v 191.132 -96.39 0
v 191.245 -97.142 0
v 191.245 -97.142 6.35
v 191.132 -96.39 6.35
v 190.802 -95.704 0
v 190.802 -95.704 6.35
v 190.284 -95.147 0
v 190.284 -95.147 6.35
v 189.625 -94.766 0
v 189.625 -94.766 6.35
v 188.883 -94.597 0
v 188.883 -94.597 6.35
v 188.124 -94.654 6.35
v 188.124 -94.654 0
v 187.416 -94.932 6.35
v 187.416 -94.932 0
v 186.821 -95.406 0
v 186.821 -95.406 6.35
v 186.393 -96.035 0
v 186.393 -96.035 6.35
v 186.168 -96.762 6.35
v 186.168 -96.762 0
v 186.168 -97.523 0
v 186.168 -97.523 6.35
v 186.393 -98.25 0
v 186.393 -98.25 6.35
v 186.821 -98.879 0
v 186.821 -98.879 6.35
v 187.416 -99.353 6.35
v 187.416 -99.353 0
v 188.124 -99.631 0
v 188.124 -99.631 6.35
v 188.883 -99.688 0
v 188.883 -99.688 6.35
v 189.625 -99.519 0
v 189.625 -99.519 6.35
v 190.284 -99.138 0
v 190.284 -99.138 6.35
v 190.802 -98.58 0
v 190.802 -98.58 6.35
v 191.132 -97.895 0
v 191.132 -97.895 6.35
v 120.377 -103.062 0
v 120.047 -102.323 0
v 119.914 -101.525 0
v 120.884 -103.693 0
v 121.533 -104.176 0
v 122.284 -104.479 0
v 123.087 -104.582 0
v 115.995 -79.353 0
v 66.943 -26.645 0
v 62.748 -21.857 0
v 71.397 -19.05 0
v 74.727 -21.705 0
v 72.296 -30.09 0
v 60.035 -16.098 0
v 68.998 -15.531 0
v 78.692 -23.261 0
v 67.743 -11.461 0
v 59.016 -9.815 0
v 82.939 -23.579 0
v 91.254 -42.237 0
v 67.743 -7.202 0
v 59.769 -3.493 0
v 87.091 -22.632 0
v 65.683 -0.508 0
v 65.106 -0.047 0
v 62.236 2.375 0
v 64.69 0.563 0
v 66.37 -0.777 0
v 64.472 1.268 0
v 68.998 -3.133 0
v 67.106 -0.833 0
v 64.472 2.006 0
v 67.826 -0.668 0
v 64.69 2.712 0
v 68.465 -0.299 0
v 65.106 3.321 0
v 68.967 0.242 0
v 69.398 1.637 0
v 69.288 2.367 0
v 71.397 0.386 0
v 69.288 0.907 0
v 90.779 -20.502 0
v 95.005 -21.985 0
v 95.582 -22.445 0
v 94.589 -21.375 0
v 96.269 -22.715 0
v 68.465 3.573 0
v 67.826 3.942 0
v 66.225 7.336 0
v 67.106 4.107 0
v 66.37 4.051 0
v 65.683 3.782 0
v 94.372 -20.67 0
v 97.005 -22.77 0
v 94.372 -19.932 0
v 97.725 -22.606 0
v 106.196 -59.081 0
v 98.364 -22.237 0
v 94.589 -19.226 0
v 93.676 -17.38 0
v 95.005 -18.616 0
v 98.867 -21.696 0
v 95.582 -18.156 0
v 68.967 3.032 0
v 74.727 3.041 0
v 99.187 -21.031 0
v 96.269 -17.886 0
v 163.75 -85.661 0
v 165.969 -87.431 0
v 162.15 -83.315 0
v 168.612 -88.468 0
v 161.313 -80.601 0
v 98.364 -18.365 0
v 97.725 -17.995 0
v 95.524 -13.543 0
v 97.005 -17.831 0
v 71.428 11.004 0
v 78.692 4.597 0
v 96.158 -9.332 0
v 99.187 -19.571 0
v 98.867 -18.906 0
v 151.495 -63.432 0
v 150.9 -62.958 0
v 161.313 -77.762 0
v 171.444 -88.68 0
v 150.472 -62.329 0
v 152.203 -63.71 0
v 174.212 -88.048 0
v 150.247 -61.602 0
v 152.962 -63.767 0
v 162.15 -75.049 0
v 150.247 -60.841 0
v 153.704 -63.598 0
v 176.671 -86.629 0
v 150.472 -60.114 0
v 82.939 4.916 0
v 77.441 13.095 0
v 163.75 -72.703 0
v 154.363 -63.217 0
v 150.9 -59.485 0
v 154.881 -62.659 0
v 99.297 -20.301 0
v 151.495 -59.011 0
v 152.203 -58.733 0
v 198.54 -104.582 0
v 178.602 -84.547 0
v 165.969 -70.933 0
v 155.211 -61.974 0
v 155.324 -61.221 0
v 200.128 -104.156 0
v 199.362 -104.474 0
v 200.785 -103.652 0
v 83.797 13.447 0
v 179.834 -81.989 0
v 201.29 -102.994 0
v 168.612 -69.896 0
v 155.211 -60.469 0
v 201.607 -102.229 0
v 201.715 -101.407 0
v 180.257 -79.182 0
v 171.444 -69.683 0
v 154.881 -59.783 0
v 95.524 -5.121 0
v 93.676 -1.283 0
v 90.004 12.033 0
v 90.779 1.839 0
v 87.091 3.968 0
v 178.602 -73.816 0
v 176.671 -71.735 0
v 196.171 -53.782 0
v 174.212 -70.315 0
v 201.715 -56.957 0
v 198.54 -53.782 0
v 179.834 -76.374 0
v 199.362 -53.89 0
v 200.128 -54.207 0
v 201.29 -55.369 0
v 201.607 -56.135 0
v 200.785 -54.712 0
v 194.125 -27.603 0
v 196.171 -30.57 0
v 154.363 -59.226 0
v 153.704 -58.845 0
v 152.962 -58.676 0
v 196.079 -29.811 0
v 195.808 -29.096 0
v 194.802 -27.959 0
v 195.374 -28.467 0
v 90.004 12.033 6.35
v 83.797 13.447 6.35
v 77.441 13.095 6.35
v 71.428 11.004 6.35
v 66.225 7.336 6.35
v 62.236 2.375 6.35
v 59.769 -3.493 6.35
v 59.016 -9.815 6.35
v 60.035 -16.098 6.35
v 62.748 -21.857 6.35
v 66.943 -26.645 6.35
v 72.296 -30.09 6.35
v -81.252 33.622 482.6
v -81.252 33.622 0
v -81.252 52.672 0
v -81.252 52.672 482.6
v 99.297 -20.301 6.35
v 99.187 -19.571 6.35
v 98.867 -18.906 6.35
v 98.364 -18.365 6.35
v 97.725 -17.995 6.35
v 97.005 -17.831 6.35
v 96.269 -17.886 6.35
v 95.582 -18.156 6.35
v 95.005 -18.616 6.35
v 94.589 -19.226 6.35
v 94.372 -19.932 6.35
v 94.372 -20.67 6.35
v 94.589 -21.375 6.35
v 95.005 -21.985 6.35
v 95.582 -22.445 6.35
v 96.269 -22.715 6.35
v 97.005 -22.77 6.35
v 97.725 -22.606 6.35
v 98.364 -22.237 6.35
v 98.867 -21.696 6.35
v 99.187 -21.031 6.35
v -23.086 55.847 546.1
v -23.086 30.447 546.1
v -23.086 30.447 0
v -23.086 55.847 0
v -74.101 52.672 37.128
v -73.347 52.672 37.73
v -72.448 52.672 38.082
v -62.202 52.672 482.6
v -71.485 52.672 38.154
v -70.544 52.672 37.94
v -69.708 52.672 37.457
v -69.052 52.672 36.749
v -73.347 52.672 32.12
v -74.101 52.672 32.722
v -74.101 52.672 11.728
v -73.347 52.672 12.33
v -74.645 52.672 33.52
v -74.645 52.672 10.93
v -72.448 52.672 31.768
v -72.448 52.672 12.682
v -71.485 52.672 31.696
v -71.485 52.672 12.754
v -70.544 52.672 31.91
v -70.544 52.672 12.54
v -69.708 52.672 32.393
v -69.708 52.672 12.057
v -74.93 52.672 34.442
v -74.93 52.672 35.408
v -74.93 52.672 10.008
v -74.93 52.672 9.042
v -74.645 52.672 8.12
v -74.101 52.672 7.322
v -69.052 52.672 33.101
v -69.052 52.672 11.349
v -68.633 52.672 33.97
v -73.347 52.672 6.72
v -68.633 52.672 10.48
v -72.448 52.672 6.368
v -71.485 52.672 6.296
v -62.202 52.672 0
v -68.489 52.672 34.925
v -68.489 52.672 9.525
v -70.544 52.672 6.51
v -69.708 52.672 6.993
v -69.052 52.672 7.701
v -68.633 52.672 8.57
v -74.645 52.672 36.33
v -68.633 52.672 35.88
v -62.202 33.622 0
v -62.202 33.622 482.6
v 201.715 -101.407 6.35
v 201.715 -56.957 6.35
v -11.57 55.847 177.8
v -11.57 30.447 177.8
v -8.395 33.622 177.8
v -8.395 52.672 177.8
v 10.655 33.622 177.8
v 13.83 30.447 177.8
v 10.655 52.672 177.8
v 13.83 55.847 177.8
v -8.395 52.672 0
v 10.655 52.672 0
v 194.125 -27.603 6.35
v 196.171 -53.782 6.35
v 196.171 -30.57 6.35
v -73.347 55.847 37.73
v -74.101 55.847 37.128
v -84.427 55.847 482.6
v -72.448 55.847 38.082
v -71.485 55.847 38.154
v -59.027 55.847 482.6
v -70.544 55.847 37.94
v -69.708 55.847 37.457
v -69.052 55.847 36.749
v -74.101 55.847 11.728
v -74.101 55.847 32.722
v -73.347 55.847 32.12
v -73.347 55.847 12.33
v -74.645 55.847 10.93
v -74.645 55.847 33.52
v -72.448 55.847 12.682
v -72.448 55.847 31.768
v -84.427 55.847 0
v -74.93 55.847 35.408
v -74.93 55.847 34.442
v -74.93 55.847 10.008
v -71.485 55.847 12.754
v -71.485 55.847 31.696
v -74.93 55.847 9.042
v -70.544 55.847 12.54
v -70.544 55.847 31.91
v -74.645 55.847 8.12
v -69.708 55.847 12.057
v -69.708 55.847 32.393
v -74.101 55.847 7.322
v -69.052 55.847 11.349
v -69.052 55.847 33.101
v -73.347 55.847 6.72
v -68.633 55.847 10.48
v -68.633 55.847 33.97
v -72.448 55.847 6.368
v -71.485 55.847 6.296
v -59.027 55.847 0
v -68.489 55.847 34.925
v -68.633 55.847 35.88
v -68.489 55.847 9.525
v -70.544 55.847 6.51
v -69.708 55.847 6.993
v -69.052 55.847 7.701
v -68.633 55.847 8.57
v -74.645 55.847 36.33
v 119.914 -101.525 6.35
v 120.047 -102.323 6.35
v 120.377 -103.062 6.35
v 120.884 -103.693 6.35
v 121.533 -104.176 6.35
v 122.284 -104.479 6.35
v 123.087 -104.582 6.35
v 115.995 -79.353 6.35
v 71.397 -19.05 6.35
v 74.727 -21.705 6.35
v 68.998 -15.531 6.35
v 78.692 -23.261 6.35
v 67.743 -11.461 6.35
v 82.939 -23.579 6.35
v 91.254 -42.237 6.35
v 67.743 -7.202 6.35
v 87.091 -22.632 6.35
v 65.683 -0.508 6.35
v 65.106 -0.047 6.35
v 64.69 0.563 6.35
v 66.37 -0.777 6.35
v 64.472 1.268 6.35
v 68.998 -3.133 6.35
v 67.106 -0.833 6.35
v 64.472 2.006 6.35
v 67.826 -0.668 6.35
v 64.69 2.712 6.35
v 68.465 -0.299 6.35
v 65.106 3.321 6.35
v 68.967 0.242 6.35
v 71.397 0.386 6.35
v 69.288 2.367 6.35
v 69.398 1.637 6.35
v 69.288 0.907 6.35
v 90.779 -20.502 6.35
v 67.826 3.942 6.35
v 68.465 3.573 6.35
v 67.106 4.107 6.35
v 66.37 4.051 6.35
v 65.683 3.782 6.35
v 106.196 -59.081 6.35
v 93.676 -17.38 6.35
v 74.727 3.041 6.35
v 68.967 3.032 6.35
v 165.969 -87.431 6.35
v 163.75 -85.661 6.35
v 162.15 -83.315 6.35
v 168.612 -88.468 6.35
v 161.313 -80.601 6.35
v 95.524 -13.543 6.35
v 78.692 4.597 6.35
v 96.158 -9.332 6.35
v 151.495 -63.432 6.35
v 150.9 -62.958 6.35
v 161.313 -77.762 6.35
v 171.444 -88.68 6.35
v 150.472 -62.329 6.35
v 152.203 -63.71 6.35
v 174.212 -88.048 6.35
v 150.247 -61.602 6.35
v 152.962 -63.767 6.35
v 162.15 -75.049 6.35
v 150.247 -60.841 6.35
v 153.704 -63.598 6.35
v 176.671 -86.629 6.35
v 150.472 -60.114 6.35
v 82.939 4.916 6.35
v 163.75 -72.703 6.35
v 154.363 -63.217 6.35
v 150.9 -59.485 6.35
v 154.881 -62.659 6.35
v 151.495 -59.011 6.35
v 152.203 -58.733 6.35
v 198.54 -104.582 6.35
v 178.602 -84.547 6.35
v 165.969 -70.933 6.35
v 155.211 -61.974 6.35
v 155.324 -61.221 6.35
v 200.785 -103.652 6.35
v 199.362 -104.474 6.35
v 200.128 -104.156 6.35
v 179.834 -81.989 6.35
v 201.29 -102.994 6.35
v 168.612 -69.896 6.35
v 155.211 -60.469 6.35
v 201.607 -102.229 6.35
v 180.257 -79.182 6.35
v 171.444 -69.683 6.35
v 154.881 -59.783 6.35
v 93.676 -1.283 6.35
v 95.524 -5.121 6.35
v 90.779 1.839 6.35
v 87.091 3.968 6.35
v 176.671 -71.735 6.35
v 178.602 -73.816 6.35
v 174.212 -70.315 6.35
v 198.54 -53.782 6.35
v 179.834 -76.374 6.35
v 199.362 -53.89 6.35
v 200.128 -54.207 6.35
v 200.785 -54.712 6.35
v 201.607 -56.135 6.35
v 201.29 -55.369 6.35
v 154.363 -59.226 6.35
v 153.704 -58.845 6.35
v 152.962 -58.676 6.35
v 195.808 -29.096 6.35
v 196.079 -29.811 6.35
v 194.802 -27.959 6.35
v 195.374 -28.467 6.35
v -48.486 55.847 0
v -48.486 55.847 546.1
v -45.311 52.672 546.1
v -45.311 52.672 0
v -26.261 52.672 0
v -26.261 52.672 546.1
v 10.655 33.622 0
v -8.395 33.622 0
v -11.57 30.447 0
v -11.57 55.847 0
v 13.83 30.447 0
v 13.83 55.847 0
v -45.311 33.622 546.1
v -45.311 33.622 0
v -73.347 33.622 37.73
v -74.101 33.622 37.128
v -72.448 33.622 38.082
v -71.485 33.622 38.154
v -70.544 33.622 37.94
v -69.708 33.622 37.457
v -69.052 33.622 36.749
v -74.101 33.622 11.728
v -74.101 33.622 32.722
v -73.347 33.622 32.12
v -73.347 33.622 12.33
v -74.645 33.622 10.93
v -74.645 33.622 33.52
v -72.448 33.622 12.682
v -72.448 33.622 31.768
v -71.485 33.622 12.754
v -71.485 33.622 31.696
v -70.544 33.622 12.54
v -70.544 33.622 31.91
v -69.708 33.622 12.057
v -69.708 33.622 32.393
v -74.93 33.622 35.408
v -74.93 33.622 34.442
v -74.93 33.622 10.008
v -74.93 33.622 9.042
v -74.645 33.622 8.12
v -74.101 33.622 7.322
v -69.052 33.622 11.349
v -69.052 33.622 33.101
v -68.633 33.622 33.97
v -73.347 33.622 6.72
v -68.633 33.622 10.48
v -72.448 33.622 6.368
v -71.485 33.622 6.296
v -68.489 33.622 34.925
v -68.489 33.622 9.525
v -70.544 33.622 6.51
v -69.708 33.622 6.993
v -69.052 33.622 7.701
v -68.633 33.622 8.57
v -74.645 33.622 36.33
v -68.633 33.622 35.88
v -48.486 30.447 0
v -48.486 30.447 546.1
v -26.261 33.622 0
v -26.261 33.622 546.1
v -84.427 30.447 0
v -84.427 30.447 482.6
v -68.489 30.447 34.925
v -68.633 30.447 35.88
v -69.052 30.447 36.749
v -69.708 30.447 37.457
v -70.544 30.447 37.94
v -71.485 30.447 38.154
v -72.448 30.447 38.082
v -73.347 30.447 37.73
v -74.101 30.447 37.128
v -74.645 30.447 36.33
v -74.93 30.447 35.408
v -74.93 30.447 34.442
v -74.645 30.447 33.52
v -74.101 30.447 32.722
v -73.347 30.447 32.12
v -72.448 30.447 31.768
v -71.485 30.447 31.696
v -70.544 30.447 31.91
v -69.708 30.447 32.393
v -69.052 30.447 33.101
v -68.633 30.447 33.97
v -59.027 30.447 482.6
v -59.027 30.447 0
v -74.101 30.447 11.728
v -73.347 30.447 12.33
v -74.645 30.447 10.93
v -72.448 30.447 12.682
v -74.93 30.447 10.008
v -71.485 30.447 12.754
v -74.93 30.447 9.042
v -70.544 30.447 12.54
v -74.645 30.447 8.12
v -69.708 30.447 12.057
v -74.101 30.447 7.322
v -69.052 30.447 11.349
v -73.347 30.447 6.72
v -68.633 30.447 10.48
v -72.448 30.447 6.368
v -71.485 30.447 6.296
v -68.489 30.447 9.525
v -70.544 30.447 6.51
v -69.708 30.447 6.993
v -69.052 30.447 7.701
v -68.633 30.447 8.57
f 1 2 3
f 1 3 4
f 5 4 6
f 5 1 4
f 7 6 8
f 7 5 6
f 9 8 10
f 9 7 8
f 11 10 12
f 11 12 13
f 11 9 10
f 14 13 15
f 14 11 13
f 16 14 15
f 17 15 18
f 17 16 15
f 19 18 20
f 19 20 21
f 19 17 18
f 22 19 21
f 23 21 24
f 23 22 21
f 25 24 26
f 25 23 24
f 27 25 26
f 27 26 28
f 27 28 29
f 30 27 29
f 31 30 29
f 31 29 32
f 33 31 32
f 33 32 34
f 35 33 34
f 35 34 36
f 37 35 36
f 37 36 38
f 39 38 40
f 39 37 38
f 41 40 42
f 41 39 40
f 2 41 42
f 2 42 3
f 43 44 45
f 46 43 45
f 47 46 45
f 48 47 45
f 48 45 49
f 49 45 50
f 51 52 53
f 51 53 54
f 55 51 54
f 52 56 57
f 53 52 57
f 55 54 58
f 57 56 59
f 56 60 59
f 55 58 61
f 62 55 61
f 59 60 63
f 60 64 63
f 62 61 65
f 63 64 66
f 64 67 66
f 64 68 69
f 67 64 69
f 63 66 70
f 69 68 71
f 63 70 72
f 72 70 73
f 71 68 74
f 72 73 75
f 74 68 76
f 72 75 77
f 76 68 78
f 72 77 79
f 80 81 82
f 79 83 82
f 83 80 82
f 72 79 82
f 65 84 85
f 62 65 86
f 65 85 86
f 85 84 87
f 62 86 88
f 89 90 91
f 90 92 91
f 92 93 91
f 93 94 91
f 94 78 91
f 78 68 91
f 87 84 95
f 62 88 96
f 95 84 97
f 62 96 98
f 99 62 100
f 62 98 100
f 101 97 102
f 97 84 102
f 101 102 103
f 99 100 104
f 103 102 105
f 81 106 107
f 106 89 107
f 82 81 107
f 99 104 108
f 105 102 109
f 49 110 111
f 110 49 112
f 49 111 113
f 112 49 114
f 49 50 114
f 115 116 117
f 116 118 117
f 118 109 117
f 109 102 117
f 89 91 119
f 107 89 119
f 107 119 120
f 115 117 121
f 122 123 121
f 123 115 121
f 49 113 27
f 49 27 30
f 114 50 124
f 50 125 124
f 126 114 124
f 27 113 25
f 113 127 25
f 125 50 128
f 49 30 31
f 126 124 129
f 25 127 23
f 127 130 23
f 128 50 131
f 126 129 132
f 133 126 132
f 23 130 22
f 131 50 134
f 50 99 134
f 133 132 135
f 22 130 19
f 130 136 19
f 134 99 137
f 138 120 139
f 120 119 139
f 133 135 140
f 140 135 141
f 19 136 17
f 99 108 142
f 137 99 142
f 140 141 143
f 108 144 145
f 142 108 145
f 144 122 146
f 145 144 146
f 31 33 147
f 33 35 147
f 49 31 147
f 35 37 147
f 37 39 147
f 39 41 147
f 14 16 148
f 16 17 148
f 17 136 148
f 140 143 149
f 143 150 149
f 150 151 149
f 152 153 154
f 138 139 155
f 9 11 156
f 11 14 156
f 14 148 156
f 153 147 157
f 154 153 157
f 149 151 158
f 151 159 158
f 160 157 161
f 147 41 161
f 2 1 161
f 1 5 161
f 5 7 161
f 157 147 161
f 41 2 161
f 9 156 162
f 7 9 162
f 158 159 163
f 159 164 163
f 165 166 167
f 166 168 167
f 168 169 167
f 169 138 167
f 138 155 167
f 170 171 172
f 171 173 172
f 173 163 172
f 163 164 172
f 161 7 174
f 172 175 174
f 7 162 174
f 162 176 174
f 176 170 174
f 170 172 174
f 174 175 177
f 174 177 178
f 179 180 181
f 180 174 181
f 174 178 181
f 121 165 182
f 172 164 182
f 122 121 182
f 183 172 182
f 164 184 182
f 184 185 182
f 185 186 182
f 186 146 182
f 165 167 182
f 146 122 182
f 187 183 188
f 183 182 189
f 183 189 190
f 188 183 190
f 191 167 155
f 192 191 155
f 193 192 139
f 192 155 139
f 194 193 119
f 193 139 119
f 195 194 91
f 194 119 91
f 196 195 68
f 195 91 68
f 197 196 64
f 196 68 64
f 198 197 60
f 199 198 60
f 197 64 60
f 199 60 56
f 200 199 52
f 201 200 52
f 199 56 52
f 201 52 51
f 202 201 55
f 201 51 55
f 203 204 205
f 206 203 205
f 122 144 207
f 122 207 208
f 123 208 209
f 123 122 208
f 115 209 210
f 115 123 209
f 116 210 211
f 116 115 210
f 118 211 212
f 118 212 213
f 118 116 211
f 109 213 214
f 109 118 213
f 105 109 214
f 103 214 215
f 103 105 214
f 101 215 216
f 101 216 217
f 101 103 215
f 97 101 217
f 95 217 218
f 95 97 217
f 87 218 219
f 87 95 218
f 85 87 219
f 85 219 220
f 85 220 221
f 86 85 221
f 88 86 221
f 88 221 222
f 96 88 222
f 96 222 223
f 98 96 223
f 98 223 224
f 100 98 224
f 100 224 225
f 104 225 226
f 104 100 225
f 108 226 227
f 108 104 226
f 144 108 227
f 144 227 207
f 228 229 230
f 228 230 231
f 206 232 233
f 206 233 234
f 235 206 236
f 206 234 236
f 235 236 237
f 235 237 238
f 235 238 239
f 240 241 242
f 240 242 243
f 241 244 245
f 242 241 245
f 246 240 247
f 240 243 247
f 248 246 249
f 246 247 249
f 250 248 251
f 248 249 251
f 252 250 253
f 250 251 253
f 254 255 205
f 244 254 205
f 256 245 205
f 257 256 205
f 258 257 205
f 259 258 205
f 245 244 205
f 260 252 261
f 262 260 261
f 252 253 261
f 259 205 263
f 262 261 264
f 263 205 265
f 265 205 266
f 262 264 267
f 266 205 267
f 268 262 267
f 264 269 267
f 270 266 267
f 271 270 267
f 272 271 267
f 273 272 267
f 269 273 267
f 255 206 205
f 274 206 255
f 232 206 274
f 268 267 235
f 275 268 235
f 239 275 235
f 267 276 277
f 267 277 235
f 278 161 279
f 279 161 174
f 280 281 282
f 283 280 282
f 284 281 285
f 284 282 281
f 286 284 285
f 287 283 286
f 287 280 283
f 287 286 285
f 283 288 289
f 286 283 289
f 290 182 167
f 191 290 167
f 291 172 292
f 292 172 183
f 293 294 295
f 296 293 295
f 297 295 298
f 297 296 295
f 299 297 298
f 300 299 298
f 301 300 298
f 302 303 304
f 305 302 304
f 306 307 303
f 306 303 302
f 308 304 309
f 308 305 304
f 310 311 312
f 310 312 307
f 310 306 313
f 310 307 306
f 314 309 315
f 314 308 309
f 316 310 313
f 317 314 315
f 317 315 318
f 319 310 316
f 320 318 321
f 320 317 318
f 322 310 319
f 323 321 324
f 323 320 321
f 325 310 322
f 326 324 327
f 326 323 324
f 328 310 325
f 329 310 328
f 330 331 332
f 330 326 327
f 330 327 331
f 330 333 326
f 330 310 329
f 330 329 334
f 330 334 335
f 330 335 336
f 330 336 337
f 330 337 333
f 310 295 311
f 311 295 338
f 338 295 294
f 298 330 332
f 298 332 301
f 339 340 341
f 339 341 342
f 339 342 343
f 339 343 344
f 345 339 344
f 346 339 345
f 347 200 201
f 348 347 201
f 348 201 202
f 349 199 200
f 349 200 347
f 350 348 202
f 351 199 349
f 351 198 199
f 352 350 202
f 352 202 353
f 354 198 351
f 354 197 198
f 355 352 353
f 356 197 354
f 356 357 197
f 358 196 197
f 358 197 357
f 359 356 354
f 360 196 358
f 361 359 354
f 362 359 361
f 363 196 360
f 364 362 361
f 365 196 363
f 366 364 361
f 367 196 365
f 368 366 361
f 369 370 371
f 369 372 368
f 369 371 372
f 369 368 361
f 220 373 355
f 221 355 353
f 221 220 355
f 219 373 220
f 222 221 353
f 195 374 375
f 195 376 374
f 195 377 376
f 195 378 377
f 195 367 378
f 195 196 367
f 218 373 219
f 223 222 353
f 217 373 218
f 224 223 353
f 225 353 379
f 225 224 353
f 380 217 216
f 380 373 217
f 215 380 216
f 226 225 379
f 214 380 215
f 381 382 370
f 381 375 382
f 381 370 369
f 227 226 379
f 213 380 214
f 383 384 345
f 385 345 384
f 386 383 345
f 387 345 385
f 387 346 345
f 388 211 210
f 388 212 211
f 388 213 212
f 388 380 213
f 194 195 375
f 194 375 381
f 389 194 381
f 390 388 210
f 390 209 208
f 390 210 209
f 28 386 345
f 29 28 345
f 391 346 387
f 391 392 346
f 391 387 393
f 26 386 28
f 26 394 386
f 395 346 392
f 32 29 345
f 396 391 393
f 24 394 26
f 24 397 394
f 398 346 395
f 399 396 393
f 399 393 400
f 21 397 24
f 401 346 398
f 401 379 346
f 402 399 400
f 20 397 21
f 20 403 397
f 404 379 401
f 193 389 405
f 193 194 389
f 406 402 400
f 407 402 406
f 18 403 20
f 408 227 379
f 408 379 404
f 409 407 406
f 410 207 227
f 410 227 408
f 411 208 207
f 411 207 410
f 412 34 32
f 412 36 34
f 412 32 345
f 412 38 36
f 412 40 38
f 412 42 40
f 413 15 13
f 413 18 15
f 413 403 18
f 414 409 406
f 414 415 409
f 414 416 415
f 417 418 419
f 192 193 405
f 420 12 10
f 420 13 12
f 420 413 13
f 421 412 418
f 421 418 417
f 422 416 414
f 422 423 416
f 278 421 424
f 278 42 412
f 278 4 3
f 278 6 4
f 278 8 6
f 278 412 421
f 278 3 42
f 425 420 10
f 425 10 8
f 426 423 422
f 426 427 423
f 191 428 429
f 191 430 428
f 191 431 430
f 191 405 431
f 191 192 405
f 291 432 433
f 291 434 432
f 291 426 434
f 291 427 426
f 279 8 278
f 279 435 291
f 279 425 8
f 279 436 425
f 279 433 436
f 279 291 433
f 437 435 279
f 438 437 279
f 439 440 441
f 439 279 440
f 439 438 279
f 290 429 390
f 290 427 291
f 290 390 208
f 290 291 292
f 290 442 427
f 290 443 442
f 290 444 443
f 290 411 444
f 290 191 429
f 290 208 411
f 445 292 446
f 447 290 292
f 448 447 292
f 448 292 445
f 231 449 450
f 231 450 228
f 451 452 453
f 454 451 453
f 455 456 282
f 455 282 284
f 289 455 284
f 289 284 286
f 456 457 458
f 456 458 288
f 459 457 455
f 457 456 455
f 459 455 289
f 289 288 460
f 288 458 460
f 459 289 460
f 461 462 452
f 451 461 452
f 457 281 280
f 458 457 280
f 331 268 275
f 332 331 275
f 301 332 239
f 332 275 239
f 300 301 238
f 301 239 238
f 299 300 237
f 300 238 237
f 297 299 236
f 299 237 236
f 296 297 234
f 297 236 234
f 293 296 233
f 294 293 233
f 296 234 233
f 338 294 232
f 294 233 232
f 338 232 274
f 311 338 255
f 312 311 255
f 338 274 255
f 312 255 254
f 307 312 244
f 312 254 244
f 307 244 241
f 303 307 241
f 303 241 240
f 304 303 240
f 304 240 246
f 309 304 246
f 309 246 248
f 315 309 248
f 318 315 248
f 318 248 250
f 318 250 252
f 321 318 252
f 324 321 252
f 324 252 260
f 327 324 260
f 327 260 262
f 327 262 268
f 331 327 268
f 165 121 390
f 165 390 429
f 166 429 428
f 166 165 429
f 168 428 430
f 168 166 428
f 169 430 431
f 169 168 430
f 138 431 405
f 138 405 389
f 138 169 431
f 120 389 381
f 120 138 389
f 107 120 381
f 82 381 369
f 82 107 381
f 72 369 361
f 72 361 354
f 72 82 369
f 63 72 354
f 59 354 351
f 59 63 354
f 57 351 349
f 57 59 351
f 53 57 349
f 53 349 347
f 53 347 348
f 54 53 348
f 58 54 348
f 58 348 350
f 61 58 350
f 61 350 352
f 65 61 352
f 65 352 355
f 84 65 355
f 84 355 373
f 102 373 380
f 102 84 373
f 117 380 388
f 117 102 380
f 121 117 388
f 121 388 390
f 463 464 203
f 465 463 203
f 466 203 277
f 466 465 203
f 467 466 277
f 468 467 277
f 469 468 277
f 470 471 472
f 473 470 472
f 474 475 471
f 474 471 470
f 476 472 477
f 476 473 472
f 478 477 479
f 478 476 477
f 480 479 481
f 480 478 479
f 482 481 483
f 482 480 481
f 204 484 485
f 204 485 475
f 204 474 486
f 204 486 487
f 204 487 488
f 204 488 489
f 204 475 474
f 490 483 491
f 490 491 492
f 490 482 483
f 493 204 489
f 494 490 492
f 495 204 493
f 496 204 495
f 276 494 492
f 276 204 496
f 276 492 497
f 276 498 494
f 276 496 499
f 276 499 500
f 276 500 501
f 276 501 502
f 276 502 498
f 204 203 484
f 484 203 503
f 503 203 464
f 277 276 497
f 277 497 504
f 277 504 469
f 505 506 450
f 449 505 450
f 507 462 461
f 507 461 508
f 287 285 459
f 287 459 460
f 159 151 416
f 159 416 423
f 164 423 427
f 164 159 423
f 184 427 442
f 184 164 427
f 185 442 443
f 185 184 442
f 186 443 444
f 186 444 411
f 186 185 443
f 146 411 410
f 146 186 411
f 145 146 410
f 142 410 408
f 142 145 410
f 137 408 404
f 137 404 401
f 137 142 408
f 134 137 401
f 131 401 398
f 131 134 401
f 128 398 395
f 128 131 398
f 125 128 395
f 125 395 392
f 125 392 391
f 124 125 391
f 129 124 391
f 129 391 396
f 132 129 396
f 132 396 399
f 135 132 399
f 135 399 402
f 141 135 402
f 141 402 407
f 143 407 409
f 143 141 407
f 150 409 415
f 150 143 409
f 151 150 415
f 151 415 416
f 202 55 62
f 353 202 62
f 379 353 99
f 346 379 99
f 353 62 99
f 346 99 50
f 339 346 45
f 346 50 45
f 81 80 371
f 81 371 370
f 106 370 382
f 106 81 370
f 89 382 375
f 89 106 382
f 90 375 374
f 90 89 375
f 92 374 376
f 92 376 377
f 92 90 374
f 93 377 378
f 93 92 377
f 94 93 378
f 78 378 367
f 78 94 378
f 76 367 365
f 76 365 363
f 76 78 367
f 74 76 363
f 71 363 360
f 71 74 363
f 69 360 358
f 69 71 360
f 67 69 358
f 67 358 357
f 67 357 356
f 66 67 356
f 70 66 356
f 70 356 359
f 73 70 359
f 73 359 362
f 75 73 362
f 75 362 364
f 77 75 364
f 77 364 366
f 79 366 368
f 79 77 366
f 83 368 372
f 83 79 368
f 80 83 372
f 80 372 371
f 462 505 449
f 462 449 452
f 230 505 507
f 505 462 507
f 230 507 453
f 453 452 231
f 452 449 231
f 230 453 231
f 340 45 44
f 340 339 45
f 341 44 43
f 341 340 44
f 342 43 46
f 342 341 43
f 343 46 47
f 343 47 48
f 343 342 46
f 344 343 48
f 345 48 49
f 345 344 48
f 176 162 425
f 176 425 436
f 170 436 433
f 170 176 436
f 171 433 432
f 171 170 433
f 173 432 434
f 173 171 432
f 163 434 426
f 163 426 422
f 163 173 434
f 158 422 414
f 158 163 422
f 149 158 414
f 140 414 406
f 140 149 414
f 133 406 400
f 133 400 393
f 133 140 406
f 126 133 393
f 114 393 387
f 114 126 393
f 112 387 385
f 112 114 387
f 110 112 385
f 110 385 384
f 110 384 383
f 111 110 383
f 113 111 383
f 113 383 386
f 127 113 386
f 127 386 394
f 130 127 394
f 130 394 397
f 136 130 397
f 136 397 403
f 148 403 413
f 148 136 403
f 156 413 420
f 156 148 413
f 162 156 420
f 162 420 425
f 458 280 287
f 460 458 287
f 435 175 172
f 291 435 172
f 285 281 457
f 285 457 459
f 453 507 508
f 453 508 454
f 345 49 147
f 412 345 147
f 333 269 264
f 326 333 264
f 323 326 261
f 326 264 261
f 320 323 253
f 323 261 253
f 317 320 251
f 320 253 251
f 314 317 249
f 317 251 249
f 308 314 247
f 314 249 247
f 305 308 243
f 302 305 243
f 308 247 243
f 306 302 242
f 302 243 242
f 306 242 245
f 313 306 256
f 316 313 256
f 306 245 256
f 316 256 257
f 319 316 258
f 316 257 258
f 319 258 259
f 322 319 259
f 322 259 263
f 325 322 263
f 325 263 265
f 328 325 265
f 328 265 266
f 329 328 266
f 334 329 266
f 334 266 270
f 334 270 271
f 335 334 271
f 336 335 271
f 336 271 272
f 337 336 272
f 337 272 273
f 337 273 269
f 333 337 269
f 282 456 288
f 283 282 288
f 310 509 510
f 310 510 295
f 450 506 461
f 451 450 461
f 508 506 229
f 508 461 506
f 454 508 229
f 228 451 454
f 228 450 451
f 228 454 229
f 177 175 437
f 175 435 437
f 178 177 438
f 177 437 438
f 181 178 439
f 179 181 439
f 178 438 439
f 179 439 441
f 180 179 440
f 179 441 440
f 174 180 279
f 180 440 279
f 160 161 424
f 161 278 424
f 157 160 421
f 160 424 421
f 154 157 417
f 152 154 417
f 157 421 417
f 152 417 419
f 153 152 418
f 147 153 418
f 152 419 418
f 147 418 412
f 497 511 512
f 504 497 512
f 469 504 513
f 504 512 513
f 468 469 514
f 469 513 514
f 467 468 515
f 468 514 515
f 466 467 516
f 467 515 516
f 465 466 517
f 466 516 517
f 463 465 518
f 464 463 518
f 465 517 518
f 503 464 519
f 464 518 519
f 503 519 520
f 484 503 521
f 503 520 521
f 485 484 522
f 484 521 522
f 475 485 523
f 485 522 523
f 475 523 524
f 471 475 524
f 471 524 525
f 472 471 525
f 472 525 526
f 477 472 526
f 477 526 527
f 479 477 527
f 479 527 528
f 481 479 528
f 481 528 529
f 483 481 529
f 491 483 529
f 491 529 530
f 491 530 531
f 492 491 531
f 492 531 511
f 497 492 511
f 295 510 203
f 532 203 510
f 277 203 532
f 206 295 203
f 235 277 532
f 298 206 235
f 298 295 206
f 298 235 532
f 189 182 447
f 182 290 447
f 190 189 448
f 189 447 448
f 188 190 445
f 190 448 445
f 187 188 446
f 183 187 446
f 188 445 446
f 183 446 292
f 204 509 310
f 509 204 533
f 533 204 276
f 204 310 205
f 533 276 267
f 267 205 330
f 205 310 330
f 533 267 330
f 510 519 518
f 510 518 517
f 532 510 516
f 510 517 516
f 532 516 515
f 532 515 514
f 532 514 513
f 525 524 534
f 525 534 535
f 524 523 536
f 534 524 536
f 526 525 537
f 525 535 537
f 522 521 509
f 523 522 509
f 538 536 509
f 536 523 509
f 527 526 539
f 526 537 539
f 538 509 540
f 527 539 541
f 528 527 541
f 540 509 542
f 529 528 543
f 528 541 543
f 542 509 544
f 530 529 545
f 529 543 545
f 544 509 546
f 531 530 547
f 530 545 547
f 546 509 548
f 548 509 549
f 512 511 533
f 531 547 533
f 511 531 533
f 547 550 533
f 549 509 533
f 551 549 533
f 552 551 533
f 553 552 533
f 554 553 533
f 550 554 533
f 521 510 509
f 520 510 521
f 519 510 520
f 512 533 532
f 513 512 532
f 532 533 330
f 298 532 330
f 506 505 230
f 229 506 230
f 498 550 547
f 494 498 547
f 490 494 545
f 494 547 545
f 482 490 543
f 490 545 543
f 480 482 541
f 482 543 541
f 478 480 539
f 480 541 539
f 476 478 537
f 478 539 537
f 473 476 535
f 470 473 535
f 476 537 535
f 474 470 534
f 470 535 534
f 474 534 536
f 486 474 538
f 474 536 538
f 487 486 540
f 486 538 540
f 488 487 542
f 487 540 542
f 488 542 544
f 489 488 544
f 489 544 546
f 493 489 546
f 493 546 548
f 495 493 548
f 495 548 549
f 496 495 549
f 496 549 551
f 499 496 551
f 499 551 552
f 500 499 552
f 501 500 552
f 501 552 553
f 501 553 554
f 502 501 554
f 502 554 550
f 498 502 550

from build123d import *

# Parameters (mm, degrees)
F0_W     = 25.4
F0_H     = 25.4
F0_W_2   = 19.05
F0_H_2   = 19.05
F1_DEPTH = 482.6
F2_R     = 3.2385
F3_DEPTH = 25.4
F4_DEPTH = 546.1
F5_DEPTH = 177.8
F6_R     = 2.4765
F6_R_2   = 14.2875
F6_R_3   = 2.5527
F6_R_4   = 9.525
F7_DEPTH = 6.35
F8_R     = 3.175


# Not quite as in the source:
# - a length typed as a fraction of an inch, garbled in the dataset ("3 / 203.2 mm" for 3/8 in), is restored


with BuildPart() as f1:
    # F0 (on Top) → F1 (new body)
    with BuildSketch(Plane.XY):
        with Locations((-71.7274532759, 43.1469418108)):
            Rectangle(F0_W, F0_H)
        with Locations((-71.7274532759, 43.1469418108)):
            Rectangle(F0_W_2, F0_H_2, mode=Mode.SUBTRACT)
    extrude(amount=F1_DEPTH)

    # F2 (on face) → F3 (cut, through all)
    with BuildSketch(Plane.XZ.offset(-30.4469418108)):
        with Locations((-71.7274532759, 34.925)):
            Circle(F2_R)
        with Locations((-71.7274532759, 9.525)):
            Circle(F2_R)
    extrude(amount=-F3_DEPTH, mode=Mode.SUBTRACT)


with BuildPart() as f4:
    # F0 (on Top) → F4 (new body)
    with BuildSketch(Plane.XY):
        with Locations((-35.7863716781, 43.1469418108)):
            Rectangle(F0_W, F0_H)
        with Locations((-35.7863716781, 43.1469418108)):
            Rectangle(F0_W_2, F0_H_2, mode=Mode.SUBTRACT)
    extrude(amount=F4_DEPTH)


with BuildPart() as f5:
    # F0 (on Top) → F5 (new body)
    with BuildSketch(Plane.XY):
        with Locations((1.1303923199, 43.1469418108)):
            Rectangle(F0_W, F0_H)
        with Locations((1.1303923199, 43.1469418108)):
            Rectangle(F0_W_2, F0_H_2, mode=Mode.SUBTRACT)
    extrude(amount=F5_DEPTH)


with BuildPart() as f7:
    # F6 (on Top) → F7 (new body)
    with BuildSketch(Plane.XY):
        with BuildLine():
            Line((196.1707963228, -28.3818552375), (90.0035320812, 12.032559313))
            ThreePointArc((90.0035320812, 12.032559313), (60.7971369321, -0.4729343166), (72.2960630652, -30.0900845224))
            ThreePointArc((72.2960630652, -30.0900845224), (107.0316785467, -60.3610906142), (119.9707963228, -104.5818552375))
            Line((119.9707963228, -104.5818552375), (145.3707963228, -104.5818552375))
            Line((145.3707963228, -104.5818552375), (145.3707963228, -53.7818552375))
            Line((145.3707963228, -53.7818552375), (196.1707963228, -53.7818552375))
            Line((196.1707963228, -53.7818552375), (196.1707963228, -28.3818552375))
        make_face()
        with Locations((96.8203453355, -20.3007543763)):
            Circle(F6_R, mode=Mode.SUBTRACT)
        with Locations((81.8707963228, -9.3318552375)):
            Circle(F6_R_2, mode=Mode.SUBTRACT)
        with Locations((66.9212473101, 1.6370439013)):
            Circle(F6_R, mode=Mode.SUBTRACT)
        Polygon((201.7153054476, -53.7818552375), (196.1707963228, -53.7818552375), (145.3707963228, -53.7818552375), (145.3707963228, -104.5818552375), (201.7153054476, -104.5818552375), align=None)
        with Locations((188.6924888704, -97.1423674796)):
            Circle(F6_R_3, mode=Mode.SUBTRACT)
        with Locations((170.7319766283, -79.1818552375)):
            Circle(F6_R_4, mode=Mode.SUBTRACT)
        with Locations((152.7714643862, -61.2213429953)):
            Circle(F6_R_3, mode=Mode.SUBTRACT)
    extrude(amount=F7_DEPTH)

    # F8
    f8_edges = [f7.edges().sort_by_distance(p)[0] for p in [
        (196.170796, -28.381855, 3.175),
        (119.970796, -104.581855, 3.175),
        (201.715305, -53.781855, 3.175),
        (201.715305, -104.581855, 3.175),
    ]]
    fillet(f8_edges, radius=F8_R)


solid = Compound([f1.part, f4.part, f5.part, f7.part])
